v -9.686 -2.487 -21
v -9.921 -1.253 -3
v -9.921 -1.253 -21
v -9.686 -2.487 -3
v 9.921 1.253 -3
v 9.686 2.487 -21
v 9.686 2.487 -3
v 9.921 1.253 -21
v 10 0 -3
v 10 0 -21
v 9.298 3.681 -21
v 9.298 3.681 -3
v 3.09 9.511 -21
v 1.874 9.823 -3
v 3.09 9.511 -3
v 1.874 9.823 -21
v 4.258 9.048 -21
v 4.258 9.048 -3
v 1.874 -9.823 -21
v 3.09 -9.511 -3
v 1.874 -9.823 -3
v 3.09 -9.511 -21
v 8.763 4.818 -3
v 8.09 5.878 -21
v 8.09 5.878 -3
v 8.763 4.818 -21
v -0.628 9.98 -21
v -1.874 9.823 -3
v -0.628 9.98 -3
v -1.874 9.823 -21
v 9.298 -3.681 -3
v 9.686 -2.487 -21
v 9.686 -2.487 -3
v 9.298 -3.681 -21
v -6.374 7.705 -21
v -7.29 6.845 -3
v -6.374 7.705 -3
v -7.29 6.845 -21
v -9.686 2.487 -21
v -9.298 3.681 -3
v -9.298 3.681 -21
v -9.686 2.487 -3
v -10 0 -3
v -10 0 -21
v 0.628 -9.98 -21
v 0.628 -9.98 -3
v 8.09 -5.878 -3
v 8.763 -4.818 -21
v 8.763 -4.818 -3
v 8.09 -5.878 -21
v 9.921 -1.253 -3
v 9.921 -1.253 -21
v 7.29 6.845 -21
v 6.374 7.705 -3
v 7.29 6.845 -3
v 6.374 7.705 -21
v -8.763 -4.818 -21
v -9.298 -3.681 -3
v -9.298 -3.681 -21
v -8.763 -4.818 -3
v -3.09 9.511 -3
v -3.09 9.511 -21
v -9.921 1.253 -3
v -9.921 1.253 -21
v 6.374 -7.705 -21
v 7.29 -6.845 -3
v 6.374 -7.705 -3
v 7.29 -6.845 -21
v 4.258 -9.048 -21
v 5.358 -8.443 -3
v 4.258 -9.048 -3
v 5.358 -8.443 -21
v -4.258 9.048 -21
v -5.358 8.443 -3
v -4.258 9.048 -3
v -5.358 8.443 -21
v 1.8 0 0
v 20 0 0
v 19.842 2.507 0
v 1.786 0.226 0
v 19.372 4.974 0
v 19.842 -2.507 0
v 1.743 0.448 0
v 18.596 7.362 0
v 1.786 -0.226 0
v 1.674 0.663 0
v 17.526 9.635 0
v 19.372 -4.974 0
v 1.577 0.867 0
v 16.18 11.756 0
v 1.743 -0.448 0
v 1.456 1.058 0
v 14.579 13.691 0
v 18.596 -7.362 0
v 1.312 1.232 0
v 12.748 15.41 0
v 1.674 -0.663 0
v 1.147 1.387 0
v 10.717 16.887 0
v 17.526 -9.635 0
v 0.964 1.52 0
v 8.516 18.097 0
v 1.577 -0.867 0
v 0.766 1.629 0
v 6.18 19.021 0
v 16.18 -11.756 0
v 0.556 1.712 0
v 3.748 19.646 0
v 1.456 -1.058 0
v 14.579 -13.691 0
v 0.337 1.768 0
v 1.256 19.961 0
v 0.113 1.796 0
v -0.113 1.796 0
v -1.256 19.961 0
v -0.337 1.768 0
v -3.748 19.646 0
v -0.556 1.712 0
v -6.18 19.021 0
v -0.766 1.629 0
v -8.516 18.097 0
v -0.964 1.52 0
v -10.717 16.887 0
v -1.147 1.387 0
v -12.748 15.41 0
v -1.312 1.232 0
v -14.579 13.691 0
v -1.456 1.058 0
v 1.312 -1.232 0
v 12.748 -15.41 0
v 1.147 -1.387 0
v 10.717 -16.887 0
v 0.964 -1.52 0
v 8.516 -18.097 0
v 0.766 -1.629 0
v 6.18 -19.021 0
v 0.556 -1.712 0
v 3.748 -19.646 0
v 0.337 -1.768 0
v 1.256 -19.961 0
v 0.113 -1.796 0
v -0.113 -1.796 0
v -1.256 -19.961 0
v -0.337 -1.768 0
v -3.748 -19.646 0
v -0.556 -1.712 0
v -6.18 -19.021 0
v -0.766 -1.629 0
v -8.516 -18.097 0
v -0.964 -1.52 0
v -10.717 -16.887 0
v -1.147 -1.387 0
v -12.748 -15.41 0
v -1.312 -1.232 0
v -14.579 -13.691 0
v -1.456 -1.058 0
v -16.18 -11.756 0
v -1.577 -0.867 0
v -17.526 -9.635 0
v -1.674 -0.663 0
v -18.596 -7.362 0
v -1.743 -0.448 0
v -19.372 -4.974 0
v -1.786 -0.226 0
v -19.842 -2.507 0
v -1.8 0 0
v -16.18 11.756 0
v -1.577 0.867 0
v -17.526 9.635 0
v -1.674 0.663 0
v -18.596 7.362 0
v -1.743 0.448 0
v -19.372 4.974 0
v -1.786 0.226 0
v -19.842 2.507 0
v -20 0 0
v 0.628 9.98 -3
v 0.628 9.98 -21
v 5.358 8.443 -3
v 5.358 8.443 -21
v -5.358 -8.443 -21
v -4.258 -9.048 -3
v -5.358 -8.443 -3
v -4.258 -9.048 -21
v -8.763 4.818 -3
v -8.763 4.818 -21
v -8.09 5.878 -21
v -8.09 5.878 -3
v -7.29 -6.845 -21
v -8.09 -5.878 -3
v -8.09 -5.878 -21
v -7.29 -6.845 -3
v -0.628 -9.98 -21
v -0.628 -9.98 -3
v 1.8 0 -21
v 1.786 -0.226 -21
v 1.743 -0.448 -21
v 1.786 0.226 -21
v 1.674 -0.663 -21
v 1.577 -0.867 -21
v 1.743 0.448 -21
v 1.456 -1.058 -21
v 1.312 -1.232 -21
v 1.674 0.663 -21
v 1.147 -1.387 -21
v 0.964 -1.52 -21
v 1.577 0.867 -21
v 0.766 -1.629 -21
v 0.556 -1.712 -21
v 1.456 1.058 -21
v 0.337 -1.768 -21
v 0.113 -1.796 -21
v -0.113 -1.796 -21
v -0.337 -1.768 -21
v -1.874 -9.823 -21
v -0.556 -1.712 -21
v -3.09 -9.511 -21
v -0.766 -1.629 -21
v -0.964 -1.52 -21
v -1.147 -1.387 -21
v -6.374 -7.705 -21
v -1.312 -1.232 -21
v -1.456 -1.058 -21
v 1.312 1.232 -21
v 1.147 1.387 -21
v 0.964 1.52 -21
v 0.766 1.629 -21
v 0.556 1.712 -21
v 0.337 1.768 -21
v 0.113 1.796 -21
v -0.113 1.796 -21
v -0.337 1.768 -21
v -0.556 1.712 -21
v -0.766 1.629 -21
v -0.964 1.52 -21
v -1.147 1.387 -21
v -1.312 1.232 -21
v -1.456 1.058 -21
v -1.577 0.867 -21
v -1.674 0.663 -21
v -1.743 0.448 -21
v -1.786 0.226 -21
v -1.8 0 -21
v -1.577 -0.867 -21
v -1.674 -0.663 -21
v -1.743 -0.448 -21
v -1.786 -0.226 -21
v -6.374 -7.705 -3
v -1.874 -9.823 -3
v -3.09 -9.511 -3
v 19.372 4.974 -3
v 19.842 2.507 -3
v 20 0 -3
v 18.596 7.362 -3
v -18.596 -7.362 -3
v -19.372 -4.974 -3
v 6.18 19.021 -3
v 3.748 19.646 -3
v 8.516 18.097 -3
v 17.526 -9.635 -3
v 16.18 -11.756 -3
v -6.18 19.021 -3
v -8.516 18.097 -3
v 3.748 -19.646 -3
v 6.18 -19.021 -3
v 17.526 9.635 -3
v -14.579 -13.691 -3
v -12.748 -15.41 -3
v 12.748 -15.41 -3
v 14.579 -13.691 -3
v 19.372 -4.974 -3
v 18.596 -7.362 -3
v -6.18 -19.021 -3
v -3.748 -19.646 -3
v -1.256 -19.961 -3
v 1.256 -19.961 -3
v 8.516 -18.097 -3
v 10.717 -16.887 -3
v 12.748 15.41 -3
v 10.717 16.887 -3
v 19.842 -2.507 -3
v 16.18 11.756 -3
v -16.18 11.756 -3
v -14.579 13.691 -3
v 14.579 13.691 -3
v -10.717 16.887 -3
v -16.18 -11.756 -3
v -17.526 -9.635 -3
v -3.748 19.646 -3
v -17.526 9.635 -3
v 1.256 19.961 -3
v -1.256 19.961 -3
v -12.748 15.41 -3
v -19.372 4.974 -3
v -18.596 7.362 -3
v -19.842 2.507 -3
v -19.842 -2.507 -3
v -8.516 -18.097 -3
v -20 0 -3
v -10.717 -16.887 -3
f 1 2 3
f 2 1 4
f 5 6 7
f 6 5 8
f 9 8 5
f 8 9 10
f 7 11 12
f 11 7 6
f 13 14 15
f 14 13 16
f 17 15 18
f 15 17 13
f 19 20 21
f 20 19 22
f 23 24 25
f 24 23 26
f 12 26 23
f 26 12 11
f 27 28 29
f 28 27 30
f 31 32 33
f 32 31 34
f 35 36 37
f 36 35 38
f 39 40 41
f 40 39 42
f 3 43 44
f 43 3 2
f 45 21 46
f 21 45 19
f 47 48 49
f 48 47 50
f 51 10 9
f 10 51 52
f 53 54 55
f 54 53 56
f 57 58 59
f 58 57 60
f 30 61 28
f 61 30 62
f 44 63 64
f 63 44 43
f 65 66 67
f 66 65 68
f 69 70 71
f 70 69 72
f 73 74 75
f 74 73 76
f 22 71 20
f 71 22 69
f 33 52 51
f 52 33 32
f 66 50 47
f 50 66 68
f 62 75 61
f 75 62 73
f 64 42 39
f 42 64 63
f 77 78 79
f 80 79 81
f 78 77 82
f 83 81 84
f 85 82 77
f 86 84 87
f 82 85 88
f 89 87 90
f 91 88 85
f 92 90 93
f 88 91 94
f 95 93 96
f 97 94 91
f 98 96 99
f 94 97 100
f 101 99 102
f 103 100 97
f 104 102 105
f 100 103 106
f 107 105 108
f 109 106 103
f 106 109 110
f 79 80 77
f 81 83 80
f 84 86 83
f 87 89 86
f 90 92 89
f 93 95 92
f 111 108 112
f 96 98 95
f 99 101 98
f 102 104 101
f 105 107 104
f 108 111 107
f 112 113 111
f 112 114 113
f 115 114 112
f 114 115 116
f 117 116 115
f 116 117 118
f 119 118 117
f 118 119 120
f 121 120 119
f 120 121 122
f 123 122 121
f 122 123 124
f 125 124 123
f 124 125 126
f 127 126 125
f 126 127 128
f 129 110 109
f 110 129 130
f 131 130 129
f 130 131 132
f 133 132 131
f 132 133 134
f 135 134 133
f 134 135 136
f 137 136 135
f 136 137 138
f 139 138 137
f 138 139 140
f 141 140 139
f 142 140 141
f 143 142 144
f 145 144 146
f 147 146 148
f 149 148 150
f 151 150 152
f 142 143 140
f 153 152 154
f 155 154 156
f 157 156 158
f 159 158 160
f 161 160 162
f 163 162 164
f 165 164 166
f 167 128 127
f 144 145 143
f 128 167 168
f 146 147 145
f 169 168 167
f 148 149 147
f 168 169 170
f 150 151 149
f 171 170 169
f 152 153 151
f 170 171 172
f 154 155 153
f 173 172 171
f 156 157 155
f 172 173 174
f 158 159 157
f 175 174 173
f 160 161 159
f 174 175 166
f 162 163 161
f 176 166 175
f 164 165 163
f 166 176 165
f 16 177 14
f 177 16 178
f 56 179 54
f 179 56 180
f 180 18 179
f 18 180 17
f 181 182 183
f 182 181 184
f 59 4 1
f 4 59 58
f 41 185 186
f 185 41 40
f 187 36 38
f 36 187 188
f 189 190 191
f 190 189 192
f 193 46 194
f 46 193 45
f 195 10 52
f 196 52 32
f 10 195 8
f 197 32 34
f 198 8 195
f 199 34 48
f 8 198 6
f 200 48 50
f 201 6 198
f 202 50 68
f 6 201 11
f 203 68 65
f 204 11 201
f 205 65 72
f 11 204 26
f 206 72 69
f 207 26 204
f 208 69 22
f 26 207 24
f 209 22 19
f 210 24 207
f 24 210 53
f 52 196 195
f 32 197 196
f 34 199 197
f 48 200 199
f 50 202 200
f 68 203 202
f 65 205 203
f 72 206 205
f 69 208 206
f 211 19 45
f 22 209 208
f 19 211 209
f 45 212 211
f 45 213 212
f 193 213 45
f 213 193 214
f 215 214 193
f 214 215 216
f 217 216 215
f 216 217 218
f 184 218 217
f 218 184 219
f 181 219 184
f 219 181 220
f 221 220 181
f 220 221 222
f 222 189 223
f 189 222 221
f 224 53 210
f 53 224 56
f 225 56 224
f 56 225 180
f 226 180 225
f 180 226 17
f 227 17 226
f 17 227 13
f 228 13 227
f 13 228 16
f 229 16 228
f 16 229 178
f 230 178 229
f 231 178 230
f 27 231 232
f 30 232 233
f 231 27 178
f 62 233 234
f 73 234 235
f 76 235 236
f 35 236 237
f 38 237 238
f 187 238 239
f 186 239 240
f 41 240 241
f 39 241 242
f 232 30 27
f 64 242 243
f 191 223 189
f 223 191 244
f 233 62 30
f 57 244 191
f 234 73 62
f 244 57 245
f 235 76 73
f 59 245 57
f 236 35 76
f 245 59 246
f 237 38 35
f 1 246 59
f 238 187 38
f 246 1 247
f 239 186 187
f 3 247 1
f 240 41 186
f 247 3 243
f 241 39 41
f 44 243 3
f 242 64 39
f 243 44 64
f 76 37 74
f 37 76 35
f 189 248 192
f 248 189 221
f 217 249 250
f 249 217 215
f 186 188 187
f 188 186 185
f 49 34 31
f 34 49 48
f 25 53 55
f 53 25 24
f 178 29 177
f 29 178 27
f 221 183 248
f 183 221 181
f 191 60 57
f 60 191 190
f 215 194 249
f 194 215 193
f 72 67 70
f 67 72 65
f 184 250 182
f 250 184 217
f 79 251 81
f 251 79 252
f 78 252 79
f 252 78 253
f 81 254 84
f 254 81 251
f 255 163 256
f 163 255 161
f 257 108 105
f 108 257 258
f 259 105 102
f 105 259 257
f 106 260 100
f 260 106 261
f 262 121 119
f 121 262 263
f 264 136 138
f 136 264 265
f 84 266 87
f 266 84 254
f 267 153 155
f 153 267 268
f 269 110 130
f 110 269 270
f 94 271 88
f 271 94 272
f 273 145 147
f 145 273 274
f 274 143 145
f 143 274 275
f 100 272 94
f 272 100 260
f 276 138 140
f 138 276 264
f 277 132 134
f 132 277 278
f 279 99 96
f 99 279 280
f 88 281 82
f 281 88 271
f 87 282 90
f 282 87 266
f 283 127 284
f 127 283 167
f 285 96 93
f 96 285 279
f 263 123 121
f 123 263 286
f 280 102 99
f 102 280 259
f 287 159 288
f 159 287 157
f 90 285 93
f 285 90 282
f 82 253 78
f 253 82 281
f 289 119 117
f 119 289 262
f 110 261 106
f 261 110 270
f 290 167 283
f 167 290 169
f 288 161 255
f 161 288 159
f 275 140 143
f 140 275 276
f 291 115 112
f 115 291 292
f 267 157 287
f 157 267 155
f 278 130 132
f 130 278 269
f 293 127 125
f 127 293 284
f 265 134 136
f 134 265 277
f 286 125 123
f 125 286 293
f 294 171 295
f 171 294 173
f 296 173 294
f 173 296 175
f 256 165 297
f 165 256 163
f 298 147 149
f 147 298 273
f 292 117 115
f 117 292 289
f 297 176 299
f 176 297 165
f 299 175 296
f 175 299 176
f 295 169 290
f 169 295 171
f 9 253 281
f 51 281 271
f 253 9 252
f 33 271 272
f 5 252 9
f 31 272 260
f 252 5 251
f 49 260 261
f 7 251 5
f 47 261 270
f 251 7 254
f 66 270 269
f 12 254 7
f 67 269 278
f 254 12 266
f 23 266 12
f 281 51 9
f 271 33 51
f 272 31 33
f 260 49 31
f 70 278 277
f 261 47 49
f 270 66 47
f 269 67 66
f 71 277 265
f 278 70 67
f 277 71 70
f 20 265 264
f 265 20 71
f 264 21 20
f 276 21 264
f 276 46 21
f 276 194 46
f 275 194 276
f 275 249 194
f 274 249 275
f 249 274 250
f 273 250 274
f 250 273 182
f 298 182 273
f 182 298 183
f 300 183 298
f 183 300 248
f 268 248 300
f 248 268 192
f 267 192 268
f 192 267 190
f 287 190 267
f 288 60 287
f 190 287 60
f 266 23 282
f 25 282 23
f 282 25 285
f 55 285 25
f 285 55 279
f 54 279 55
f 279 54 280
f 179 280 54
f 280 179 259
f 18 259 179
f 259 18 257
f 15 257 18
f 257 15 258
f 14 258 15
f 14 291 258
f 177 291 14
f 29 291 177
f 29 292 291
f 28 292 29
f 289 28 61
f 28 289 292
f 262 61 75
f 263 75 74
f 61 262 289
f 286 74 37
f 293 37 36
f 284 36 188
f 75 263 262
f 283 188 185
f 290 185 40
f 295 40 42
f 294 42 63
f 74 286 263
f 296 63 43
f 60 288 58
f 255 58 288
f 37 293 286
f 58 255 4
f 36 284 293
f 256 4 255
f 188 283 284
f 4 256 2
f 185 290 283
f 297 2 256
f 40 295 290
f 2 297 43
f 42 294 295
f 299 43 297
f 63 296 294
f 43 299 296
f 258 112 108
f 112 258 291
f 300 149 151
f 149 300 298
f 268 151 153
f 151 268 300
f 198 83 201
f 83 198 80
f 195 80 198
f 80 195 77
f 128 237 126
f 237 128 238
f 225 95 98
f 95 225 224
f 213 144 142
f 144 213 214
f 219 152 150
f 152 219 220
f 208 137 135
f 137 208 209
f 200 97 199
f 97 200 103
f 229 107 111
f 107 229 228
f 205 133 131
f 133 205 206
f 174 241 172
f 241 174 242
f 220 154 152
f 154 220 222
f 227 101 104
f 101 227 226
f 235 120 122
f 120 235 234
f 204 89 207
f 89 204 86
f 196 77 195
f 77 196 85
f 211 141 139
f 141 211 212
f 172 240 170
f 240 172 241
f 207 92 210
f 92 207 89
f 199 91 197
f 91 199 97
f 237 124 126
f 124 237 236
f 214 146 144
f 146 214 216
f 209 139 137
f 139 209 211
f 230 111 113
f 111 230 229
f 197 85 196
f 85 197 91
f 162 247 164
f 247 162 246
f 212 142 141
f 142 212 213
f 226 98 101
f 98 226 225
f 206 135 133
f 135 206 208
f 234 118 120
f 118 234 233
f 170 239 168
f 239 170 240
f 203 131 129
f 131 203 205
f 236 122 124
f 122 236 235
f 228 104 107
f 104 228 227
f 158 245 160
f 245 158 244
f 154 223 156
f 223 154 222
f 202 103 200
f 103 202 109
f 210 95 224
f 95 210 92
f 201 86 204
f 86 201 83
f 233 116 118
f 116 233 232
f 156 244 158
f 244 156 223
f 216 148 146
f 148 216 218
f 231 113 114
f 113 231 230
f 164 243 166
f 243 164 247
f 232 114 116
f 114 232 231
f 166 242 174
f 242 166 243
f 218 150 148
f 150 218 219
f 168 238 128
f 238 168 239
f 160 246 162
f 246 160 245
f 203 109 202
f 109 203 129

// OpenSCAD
$fn = 50;


difference() {
	union() {
		translate(v = [0, 0, -21.0000000000]) {
			cylinder(h = 21, r = 10.0000000000);
		}
		translate(v = [0, 0, -3.0000000000]) {
			cylinder(h = 3, r = 20.0000000000);
		}
	}
	union() {
		#translate(v = [0, 0, -21]) {
			cylinder(h = 21, r = 1.8000000000);
		}
	}
}
